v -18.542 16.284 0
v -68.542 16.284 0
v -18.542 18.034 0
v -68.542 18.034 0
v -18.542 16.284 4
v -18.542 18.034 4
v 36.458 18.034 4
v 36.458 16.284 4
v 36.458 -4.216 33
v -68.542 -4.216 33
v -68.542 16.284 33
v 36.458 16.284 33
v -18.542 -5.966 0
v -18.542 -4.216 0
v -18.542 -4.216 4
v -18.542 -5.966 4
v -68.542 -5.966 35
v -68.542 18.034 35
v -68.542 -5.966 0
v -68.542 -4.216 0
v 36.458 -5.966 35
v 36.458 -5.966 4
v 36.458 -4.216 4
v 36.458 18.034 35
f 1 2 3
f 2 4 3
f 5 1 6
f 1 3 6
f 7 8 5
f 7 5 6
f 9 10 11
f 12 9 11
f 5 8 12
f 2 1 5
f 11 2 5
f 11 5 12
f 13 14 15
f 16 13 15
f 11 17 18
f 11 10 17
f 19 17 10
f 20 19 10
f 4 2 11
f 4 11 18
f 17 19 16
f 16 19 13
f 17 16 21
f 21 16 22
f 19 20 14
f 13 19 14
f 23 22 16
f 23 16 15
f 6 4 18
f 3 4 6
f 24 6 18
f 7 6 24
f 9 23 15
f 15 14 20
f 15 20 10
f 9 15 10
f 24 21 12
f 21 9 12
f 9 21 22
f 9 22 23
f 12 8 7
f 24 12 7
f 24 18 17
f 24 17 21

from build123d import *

# Parameters (mm, degrees)
SKETCH_1_W          = 105
SKETCH_1_H          = 24
EXTRUDE_1_DEPTH     = 35
SKETCH_2_W          = 33
SKETCH_2_H          = 20.5
CUT_EXTRUDE_1_DEPTH = 50
CUT_EXTRUDE_2_DEPTH = 55


with BuildPart() as part:
    # 草图1 → 凸台-拉伸1 (new body)
    with BuildSketch(Plane.XY):
        with Locations((-16.041666667, 6.034090909)):
            Rectangle(SKETCH_1_W, SKETCH_1_H)
    extrude(amount=EXTRUDE_1_DEPTH)

    # 草图2 → 切除-拉伸1 (cut)
    with BuildSketch(Plane.ZY.offset(68.541666667)):
        with Locations((16.5, 6.034090909)):
            Rectangle(SKETCH_2_W, SKETCH_2_H)
    extrude(amount=-CUT_EXTRUDE_1_DEPTH, mode=Mode.SUBTRACT)

    # 草图3 → 切除-拉伸2 (cut)
    with BuildSketch(Plane(origin=(36.458333333, 0, 0), x_dir=(0, 0, -1), z_dir=(1, 0, 0))):
        Polygon((-33, 16.284090909), (-4, 16.284090909), (-4, 18.034090909), (0, 18.034090909), (0, -5.965909091), (-4, -5.965909091), (-4, -4.215909091), (-33, -4.215909091), align=None)
    extrude(amount=-CUT_EXTRUDE_2_DEPTH, mode=Mode.SUBTRACT)


solid = part.part
